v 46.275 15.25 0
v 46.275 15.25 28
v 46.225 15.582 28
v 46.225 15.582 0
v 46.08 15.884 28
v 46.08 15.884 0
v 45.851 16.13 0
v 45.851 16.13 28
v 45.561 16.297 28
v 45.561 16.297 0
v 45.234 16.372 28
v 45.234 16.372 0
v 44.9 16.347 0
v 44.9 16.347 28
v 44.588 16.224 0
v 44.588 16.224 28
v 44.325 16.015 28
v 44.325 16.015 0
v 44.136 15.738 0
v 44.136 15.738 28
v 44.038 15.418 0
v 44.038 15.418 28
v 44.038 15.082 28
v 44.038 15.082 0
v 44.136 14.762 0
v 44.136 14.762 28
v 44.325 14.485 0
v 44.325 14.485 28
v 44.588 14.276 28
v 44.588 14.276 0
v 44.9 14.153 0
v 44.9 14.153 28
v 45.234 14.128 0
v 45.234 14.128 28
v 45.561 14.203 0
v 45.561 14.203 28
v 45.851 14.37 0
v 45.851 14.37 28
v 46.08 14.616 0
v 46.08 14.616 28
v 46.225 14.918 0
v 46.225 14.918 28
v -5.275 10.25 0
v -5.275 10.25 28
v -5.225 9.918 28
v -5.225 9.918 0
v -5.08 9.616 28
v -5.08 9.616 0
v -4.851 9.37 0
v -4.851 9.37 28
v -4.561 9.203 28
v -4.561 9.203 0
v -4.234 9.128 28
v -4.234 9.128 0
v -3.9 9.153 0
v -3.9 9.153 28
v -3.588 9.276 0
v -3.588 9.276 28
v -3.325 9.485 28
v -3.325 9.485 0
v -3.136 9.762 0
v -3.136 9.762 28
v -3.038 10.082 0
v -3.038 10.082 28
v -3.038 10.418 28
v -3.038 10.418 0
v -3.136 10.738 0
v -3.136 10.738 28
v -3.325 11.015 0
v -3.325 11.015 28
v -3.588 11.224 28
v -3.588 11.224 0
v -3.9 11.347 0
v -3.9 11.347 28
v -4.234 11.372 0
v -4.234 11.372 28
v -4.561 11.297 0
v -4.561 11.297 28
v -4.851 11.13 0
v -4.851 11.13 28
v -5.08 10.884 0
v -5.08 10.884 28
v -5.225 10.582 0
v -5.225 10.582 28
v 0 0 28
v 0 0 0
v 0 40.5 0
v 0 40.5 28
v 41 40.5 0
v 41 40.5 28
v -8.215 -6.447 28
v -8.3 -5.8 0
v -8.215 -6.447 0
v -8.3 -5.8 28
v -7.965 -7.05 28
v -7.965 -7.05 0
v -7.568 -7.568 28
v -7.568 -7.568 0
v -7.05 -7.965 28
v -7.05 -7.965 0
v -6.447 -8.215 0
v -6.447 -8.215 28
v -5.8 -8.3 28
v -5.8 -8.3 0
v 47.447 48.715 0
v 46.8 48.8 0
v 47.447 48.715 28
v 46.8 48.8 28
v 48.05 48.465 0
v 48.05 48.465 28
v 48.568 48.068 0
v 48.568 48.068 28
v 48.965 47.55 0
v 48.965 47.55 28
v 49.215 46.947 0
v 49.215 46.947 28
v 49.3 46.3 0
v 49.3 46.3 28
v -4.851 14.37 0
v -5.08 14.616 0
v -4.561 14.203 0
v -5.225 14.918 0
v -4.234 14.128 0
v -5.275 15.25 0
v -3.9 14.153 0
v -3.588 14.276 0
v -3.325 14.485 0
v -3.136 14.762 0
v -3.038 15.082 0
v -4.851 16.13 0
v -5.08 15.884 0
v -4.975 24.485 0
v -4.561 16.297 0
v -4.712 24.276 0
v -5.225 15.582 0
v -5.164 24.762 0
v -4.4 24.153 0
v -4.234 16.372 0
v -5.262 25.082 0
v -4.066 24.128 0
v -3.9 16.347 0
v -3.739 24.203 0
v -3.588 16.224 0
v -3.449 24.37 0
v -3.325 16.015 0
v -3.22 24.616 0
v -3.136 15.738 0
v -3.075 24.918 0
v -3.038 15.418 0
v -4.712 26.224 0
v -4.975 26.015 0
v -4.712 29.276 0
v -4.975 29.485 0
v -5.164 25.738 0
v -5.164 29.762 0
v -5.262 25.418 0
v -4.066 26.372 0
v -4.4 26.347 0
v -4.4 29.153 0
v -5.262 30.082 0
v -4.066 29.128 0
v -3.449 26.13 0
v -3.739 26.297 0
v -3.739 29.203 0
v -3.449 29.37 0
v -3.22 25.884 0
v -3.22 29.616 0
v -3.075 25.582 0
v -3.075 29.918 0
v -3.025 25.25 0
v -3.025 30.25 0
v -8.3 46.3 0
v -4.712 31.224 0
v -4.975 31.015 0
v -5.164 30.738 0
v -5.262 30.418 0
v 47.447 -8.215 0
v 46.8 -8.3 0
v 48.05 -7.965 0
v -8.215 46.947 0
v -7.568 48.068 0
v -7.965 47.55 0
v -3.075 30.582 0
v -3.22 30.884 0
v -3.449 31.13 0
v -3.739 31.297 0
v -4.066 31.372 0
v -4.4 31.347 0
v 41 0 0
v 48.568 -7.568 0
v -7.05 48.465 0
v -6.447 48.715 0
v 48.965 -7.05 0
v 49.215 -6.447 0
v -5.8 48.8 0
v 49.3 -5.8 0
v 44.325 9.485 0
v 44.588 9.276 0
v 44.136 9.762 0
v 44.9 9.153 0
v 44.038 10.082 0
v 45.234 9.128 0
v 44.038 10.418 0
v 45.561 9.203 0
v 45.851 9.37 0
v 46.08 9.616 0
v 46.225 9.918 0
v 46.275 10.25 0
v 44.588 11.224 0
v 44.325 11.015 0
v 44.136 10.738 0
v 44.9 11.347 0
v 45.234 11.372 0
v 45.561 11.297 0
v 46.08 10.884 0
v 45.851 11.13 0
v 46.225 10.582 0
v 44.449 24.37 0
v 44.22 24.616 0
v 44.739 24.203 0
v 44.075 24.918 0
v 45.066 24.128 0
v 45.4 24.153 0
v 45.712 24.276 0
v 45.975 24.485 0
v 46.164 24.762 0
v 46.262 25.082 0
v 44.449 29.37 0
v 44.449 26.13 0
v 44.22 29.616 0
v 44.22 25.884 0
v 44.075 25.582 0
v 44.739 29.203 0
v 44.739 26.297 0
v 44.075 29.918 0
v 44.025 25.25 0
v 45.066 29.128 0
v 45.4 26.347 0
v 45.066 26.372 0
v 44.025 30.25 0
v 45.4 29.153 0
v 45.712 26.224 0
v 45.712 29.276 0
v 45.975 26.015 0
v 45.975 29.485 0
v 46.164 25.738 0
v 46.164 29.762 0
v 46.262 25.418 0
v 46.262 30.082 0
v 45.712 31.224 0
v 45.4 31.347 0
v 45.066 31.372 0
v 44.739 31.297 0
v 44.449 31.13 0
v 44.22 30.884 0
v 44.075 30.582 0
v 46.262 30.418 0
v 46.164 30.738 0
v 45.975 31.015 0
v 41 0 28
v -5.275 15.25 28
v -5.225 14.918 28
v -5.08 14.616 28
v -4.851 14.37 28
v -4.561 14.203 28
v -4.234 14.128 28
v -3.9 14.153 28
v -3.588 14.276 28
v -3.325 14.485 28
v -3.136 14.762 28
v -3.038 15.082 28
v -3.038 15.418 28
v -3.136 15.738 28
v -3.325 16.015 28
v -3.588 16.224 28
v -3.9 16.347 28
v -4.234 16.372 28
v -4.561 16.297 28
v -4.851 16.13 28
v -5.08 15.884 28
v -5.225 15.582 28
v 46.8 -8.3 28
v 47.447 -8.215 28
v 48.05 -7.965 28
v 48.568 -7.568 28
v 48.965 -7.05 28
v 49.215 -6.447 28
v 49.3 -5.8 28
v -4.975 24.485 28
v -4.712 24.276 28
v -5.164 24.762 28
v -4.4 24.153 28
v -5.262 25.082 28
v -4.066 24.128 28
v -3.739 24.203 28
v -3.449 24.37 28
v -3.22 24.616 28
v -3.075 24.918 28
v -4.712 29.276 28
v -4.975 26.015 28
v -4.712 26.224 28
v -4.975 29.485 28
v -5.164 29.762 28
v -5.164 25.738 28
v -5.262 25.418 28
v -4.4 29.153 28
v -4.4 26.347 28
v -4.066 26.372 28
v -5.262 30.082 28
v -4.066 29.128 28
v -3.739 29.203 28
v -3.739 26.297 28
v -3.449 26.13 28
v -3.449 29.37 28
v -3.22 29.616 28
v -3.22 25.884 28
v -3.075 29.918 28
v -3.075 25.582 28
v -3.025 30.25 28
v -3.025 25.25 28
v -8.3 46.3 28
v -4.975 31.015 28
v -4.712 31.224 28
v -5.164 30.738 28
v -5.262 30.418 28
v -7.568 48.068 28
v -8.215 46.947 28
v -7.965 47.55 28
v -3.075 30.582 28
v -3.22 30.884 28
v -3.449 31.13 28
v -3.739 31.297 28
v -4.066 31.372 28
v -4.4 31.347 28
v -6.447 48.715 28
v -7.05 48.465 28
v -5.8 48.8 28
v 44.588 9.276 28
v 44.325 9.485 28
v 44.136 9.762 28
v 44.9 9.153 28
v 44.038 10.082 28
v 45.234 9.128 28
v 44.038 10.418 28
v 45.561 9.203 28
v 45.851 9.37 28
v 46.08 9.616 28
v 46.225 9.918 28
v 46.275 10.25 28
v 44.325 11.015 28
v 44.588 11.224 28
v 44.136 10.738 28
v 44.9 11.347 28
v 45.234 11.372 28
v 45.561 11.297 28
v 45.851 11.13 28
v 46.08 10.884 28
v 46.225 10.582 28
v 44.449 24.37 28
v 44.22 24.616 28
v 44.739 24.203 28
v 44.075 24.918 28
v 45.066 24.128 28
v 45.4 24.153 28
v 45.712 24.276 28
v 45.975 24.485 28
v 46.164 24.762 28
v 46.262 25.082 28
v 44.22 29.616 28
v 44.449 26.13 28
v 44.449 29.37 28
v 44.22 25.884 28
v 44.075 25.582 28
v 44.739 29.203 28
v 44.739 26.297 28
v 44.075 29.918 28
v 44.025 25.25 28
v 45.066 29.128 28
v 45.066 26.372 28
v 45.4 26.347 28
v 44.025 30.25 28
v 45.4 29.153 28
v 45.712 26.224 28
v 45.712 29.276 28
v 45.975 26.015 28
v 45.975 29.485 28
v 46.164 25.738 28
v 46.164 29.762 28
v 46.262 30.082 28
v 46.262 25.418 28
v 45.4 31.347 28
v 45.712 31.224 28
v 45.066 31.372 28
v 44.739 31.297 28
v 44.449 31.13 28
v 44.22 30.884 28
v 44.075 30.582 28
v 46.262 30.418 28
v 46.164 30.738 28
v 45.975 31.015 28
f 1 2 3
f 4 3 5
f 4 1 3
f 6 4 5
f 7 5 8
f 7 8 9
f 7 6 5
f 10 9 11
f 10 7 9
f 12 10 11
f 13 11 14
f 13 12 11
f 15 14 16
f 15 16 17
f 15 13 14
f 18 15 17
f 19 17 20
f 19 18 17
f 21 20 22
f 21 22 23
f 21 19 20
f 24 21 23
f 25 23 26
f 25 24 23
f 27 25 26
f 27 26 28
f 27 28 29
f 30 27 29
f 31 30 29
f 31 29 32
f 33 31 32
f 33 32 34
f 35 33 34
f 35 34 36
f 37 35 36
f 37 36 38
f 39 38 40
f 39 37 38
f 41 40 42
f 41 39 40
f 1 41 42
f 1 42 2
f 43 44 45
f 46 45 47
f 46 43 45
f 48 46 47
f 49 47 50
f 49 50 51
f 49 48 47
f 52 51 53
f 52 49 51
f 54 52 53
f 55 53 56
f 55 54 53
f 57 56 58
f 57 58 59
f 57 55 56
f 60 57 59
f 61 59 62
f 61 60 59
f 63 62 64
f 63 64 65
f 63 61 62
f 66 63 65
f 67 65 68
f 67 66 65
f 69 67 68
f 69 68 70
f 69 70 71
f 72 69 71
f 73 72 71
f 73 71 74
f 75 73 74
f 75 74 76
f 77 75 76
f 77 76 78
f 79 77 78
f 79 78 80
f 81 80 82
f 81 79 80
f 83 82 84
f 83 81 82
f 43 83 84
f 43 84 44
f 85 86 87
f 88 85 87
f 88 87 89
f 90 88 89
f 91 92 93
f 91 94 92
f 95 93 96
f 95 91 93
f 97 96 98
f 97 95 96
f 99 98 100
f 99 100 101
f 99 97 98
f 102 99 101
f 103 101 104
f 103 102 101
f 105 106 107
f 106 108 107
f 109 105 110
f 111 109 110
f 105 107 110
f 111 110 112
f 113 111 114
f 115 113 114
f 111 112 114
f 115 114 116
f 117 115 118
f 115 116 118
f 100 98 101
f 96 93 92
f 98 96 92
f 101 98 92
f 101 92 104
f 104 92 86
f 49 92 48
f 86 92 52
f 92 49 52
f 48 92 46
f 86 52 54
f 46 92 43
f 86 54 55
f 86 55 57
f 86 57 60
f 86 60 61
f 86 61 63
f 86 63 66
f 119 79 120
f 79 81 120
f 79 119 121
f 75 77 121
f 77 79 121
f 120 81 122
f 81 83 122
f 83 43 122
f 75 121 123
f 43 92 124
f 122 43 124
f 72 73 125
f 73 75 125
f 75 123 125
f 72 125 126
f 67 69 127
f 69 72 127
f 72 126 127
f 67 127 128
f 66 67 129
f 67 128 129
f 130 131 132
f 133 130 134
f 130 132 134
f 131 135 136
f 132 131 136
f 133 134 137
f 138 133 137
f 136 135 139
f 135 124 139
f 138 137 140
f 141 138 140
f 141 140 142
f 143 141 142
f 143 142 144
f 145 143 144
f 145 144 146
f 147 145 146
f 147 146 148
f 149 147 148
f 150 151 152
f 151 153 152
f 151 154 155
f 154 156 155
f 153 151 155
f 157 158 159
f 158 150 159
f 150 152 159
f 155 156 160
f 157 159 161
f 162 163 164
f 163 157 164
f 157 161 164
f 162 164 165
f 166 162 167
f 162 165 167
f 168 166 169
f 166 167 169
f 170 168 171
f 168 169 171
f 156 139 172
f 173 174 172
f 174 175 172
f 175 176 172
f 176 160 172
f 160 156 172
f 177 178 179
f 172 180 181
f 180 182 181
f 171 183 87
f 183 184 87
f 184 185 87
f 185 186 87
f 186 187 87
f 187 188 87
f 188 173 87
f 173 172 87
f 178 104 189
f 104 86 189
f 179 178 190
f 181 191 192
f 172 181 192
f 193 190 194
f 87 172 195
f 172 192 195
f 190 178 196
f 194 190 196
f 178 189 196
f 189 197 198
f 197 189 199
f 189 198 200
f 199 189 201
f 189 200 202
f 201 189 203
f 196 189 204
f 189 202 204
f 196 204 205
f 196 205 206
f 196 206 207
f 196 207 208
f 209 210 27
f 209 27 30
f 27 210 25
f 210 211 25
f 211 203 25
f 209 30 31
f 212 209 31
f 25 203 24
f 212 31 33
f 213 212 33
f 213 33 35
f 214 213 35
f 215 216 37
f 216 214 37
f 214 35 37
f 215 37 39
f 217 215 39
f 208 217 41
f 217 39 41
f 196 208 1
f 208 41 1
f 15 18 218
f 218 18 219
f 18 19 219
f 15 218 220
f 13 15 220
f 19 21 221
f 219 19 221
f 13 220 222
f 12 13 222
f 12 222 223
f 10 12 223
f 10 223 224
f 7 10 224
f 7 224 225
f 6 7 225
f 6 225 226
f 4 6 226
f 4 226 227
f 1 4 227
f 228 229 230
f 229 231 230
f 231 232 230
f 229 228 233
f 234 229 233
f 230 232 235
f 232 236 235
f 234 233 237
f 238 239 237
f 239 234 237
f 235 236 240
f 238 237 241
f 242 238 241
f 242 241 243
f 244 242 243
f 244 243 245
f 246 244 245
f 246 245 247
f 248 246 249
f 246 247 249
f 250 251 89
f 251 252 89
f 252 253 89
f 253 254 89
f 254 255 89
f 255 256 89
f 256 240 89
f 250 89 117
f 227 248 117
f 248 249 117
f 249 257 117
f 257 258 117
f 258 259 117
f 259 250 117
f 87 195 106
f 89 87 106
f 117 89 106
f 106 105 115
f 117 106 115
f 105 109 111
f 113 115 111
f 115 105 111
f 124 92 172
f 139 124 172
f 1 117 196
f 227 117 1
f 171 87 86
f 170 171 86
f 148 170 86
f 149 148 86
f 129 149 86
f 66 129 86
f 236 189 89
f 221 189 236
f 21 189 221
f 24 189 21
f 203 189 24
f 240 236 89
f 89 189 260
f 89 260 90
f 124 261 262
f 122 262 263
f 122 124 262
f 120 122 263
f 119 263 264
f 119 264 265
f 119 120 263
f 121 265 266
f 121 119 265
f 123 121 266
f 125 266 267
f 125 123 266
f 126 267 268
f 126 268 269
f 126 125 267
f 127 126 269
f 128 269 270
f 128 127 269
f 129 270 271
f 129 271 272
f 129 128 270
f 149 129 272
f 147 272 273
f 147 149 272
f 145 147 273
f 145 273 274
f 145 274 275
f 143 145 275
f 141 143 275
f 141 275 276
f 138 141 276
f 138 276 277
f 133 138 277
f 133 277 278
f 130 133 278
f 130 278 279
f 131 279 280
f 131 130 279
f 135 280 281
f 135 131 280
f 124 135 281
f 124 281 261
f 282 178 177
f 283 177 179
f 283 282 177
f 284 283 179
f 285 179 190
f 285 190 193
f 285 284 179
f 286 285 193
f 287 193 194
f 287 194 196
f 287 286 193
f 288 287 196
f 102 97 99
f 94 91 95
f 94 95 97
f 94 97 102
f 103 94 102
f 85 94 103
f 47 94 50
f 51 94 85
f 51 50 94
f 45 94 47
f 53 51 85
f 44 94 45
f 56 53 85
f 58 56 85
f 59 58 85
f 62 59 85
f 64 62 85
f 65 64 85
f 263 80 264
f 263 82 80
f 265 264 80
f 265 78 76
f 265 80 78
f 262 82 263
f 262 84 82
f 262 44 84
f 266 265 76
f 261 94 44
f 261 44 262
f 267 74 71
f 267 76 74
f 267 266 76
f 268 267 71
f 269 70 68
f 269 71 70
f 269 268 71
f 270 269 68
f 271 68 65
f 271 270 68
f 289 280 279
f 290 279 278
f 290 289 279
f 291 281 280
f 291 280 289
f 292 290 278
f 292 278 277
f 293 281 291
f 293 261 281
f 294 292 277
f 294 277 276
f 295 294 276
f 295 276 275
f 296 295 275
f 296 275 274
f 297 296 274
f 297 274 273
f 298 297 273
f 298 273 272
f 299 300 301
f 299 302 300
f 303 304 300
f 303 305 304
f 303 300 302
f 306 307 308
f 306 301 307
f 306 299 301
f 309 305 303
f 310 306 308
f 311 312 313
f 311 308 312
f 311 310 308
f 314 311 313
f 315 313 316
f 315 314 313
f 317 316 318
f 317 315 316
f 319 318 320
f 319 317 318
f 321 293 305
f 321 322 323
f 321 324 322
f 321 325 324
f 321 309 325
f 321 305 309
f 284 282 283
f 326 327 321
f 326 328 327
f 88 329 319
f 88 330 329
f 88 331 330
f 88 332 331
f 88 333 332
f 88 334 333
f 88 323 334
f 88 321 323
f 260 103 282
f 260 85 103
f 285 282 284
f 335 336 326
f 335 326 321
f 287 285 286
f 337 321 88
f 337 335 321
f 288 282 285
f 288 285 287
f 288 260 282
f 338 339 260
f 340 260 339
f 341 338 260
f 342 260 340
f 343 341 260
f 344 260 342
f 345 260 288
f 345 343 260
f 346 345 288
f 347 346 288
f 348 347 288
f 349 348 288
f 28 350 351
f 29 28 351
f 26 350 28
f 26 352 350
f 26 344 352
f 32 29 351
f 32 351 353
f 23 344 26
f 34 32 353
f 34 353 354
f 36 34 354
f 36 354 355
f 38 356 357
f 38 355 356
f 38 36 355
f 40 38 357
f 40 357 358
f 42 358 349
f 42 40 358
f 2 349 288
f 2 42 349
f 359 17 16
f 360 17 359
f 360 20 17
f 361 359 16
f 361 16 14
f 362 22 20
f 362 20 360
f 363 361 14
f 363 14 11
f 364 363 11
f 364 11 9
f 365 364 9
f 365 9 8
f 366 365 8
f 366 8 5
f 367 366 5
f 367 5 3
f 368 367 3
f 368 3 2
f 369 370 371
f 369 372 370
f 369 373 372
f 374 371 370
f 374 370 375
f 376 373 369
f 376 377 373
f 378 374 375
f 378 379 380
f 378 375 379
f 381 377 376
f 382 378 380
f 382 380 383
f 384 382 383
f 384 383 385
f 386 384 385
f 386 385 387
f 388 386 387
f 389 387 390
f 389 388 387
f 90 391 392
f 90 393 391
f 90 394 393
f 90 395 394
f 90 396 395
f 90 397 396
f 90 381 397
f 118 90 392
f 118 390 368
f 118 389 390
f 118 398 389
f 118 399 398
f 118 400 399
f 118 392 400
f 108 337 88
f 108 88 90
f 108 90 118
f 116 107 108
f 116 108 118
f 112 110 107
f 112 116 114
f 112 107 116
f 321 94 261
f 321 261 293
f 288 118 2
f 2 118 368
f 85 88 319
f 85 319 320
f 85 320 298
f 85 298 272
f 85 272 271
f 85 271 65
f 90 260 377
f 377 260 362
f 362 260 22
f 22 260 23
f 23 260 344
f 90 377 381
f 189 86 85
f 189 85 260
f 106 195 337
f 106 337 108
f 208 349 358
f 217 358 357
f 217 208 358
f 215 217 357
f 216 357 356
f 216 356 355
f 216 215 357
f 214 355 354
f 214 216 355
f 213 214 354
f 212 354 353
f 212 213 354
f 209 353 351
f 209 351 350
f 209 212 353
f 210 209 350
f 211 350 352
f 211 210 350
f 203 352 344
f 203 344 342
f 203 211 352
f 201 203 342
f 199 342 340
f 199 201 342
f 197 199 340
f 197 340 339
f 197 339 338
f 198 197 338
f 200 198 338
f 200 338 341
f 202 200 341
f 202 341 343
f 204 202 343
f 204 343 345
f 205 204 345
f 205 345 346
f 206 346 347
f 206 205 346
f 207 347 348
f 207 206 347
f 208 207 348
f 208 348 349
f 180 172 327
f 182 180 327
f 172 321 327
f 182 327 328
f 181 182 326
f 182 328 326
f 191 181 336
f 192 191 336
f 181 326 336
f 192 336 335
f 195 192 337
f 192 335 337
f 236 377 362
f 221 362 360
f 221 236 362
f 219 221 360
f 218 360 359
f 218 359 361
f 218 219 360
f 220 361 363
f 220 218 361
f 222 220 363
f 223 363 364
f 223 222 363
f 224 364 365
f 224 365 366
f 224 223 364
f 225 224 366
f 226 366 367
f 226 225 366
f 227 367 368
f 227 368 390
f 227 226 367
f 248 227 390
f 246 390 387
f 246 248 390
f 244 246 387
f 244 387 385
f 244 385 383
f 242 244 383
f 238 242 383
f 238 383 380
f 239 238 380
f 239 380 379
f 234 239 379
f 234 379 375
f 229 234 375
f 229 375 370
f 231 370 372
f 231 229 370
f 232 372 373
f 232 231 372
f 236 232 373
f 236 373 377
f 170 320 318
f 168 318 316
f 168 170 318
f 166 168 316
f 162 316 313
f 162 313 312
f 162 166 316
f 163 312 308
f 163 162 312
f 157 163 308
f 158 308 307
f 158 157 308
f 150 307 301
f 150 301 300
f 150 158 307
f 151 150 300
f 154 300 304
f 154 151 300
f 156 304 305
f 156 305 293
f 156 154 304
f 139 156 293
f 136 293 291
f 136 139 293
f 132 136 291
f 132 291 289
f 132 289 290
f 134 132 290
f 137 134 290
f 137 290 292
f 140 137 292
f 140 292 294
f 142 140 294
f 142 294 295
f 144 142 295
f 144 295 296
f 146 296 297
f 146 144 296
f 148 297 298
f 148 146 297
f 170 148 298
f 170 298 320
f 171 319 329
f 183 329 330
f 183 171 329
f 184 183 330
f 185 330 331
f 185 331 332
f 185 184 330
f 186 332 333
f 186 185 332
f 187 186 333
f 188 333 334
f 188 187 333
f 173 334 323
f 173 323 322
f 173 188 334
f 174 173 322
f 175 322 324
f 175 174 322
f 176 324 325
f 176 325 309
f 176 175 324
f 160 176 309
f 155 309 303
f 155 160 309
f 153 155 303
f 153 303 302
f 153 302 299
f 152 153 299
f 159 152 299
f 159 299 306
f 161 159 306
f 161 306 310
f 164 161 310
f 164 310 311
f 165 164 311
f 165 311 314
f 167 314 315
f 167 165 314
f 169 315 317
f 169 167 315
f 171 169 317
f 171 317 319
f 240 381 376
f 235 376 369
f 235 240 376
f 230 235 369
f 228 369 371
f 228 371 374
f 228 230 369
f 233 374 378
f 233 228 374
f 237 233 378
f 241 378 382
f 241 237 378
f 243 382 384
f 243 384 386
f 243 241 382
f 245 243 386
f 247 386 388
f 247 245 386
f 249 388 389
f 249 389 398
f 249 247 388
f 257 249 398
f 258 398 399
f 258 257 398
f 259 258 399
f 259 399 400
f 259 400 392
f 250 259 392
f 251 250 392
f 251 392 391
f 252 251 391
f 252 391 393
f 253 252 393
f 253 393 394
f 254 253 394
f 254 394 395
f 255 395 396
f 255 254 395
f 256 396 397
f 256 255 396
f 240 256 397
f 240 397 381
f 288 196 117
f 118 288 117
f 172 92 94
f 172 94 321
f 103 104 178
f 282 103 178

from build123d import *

# Parameters (mm, degrees)
SKETCH1_W           = 57.6
SKETCH1_H           = 57.1
SKETCH1_R           = 1.125
SKETCH1_W_2         = 41
SKETCH1_H_2         = 40.5
BOSS_EXTRUDE1_DEPTH = 28
FILLET1_R           = 2.5


with BuildPart() as part:
    # Sketch1 → Boss-Extrude1 (new body)
    with BuildSketch(Plane.XY):
        with Locations((20.5, 20.25)):
            Rectangle(SKETCH1_W, SKETCH1_H)
        with Locations((-4.15, 25.25)):
            Circle(SKETCH1_R, mode=Mode.SUBTRACT)
        with Locations((-4.15, 30.25)):
            Circle(SKETCH1_R, mode=Mode.SUBTRACT)
        with Locations(Location((-4.15, 10.25, 0), (0, 0, 180))):
            Circle(SKETCH1_R, mode=Mode.SUBTRACT)
        with Locations(Location((-4.15, 15.25, 0), (0, 0, 180))):
            Circle(SKETCH1_R, mode=Mode.SUBTRACT)
        with Locations((45.15, 15.25)):
            Circle(SKETCH1_R, mode=Mode.SUBTRACT)
        with Locations((45.15, 10.25)):
            Circle(SKETCH1_R, mode=Mode.SUBTRACT)
        with Locations(Location((45.15, 30.25, 0), (0, 0, 180))):
            Circle(SKETCH1_R, mode=Mode.SUBTRACT)
        with Locations(Location((45.15, 25.25, 0), (0, 0, 180))):
            Circle(SKETCH1_R, mode=Mode.SUBTRACT)
        with Locations((20.5, 20.25)):
            Rectangle(SKETCH1_W_2, SKETCH1_H_2, mode=Mode.SUBTRACT)
    extrude(amount=BOSS_EXTRUDE1_DEPTH)

    # Fillet1
    fillet1_edges = [part.edges().sort_by_distance(p)[0] for p in [
        (-8.3, 48.8, 14),
        (49.3, 48.8, 14),
        (49.3, -8.3, 14),
        (-8.3, -8.3, 14),
    ]]
    fillet(fillet1_edges, radius=FILLET1_R)


solid = part.part
